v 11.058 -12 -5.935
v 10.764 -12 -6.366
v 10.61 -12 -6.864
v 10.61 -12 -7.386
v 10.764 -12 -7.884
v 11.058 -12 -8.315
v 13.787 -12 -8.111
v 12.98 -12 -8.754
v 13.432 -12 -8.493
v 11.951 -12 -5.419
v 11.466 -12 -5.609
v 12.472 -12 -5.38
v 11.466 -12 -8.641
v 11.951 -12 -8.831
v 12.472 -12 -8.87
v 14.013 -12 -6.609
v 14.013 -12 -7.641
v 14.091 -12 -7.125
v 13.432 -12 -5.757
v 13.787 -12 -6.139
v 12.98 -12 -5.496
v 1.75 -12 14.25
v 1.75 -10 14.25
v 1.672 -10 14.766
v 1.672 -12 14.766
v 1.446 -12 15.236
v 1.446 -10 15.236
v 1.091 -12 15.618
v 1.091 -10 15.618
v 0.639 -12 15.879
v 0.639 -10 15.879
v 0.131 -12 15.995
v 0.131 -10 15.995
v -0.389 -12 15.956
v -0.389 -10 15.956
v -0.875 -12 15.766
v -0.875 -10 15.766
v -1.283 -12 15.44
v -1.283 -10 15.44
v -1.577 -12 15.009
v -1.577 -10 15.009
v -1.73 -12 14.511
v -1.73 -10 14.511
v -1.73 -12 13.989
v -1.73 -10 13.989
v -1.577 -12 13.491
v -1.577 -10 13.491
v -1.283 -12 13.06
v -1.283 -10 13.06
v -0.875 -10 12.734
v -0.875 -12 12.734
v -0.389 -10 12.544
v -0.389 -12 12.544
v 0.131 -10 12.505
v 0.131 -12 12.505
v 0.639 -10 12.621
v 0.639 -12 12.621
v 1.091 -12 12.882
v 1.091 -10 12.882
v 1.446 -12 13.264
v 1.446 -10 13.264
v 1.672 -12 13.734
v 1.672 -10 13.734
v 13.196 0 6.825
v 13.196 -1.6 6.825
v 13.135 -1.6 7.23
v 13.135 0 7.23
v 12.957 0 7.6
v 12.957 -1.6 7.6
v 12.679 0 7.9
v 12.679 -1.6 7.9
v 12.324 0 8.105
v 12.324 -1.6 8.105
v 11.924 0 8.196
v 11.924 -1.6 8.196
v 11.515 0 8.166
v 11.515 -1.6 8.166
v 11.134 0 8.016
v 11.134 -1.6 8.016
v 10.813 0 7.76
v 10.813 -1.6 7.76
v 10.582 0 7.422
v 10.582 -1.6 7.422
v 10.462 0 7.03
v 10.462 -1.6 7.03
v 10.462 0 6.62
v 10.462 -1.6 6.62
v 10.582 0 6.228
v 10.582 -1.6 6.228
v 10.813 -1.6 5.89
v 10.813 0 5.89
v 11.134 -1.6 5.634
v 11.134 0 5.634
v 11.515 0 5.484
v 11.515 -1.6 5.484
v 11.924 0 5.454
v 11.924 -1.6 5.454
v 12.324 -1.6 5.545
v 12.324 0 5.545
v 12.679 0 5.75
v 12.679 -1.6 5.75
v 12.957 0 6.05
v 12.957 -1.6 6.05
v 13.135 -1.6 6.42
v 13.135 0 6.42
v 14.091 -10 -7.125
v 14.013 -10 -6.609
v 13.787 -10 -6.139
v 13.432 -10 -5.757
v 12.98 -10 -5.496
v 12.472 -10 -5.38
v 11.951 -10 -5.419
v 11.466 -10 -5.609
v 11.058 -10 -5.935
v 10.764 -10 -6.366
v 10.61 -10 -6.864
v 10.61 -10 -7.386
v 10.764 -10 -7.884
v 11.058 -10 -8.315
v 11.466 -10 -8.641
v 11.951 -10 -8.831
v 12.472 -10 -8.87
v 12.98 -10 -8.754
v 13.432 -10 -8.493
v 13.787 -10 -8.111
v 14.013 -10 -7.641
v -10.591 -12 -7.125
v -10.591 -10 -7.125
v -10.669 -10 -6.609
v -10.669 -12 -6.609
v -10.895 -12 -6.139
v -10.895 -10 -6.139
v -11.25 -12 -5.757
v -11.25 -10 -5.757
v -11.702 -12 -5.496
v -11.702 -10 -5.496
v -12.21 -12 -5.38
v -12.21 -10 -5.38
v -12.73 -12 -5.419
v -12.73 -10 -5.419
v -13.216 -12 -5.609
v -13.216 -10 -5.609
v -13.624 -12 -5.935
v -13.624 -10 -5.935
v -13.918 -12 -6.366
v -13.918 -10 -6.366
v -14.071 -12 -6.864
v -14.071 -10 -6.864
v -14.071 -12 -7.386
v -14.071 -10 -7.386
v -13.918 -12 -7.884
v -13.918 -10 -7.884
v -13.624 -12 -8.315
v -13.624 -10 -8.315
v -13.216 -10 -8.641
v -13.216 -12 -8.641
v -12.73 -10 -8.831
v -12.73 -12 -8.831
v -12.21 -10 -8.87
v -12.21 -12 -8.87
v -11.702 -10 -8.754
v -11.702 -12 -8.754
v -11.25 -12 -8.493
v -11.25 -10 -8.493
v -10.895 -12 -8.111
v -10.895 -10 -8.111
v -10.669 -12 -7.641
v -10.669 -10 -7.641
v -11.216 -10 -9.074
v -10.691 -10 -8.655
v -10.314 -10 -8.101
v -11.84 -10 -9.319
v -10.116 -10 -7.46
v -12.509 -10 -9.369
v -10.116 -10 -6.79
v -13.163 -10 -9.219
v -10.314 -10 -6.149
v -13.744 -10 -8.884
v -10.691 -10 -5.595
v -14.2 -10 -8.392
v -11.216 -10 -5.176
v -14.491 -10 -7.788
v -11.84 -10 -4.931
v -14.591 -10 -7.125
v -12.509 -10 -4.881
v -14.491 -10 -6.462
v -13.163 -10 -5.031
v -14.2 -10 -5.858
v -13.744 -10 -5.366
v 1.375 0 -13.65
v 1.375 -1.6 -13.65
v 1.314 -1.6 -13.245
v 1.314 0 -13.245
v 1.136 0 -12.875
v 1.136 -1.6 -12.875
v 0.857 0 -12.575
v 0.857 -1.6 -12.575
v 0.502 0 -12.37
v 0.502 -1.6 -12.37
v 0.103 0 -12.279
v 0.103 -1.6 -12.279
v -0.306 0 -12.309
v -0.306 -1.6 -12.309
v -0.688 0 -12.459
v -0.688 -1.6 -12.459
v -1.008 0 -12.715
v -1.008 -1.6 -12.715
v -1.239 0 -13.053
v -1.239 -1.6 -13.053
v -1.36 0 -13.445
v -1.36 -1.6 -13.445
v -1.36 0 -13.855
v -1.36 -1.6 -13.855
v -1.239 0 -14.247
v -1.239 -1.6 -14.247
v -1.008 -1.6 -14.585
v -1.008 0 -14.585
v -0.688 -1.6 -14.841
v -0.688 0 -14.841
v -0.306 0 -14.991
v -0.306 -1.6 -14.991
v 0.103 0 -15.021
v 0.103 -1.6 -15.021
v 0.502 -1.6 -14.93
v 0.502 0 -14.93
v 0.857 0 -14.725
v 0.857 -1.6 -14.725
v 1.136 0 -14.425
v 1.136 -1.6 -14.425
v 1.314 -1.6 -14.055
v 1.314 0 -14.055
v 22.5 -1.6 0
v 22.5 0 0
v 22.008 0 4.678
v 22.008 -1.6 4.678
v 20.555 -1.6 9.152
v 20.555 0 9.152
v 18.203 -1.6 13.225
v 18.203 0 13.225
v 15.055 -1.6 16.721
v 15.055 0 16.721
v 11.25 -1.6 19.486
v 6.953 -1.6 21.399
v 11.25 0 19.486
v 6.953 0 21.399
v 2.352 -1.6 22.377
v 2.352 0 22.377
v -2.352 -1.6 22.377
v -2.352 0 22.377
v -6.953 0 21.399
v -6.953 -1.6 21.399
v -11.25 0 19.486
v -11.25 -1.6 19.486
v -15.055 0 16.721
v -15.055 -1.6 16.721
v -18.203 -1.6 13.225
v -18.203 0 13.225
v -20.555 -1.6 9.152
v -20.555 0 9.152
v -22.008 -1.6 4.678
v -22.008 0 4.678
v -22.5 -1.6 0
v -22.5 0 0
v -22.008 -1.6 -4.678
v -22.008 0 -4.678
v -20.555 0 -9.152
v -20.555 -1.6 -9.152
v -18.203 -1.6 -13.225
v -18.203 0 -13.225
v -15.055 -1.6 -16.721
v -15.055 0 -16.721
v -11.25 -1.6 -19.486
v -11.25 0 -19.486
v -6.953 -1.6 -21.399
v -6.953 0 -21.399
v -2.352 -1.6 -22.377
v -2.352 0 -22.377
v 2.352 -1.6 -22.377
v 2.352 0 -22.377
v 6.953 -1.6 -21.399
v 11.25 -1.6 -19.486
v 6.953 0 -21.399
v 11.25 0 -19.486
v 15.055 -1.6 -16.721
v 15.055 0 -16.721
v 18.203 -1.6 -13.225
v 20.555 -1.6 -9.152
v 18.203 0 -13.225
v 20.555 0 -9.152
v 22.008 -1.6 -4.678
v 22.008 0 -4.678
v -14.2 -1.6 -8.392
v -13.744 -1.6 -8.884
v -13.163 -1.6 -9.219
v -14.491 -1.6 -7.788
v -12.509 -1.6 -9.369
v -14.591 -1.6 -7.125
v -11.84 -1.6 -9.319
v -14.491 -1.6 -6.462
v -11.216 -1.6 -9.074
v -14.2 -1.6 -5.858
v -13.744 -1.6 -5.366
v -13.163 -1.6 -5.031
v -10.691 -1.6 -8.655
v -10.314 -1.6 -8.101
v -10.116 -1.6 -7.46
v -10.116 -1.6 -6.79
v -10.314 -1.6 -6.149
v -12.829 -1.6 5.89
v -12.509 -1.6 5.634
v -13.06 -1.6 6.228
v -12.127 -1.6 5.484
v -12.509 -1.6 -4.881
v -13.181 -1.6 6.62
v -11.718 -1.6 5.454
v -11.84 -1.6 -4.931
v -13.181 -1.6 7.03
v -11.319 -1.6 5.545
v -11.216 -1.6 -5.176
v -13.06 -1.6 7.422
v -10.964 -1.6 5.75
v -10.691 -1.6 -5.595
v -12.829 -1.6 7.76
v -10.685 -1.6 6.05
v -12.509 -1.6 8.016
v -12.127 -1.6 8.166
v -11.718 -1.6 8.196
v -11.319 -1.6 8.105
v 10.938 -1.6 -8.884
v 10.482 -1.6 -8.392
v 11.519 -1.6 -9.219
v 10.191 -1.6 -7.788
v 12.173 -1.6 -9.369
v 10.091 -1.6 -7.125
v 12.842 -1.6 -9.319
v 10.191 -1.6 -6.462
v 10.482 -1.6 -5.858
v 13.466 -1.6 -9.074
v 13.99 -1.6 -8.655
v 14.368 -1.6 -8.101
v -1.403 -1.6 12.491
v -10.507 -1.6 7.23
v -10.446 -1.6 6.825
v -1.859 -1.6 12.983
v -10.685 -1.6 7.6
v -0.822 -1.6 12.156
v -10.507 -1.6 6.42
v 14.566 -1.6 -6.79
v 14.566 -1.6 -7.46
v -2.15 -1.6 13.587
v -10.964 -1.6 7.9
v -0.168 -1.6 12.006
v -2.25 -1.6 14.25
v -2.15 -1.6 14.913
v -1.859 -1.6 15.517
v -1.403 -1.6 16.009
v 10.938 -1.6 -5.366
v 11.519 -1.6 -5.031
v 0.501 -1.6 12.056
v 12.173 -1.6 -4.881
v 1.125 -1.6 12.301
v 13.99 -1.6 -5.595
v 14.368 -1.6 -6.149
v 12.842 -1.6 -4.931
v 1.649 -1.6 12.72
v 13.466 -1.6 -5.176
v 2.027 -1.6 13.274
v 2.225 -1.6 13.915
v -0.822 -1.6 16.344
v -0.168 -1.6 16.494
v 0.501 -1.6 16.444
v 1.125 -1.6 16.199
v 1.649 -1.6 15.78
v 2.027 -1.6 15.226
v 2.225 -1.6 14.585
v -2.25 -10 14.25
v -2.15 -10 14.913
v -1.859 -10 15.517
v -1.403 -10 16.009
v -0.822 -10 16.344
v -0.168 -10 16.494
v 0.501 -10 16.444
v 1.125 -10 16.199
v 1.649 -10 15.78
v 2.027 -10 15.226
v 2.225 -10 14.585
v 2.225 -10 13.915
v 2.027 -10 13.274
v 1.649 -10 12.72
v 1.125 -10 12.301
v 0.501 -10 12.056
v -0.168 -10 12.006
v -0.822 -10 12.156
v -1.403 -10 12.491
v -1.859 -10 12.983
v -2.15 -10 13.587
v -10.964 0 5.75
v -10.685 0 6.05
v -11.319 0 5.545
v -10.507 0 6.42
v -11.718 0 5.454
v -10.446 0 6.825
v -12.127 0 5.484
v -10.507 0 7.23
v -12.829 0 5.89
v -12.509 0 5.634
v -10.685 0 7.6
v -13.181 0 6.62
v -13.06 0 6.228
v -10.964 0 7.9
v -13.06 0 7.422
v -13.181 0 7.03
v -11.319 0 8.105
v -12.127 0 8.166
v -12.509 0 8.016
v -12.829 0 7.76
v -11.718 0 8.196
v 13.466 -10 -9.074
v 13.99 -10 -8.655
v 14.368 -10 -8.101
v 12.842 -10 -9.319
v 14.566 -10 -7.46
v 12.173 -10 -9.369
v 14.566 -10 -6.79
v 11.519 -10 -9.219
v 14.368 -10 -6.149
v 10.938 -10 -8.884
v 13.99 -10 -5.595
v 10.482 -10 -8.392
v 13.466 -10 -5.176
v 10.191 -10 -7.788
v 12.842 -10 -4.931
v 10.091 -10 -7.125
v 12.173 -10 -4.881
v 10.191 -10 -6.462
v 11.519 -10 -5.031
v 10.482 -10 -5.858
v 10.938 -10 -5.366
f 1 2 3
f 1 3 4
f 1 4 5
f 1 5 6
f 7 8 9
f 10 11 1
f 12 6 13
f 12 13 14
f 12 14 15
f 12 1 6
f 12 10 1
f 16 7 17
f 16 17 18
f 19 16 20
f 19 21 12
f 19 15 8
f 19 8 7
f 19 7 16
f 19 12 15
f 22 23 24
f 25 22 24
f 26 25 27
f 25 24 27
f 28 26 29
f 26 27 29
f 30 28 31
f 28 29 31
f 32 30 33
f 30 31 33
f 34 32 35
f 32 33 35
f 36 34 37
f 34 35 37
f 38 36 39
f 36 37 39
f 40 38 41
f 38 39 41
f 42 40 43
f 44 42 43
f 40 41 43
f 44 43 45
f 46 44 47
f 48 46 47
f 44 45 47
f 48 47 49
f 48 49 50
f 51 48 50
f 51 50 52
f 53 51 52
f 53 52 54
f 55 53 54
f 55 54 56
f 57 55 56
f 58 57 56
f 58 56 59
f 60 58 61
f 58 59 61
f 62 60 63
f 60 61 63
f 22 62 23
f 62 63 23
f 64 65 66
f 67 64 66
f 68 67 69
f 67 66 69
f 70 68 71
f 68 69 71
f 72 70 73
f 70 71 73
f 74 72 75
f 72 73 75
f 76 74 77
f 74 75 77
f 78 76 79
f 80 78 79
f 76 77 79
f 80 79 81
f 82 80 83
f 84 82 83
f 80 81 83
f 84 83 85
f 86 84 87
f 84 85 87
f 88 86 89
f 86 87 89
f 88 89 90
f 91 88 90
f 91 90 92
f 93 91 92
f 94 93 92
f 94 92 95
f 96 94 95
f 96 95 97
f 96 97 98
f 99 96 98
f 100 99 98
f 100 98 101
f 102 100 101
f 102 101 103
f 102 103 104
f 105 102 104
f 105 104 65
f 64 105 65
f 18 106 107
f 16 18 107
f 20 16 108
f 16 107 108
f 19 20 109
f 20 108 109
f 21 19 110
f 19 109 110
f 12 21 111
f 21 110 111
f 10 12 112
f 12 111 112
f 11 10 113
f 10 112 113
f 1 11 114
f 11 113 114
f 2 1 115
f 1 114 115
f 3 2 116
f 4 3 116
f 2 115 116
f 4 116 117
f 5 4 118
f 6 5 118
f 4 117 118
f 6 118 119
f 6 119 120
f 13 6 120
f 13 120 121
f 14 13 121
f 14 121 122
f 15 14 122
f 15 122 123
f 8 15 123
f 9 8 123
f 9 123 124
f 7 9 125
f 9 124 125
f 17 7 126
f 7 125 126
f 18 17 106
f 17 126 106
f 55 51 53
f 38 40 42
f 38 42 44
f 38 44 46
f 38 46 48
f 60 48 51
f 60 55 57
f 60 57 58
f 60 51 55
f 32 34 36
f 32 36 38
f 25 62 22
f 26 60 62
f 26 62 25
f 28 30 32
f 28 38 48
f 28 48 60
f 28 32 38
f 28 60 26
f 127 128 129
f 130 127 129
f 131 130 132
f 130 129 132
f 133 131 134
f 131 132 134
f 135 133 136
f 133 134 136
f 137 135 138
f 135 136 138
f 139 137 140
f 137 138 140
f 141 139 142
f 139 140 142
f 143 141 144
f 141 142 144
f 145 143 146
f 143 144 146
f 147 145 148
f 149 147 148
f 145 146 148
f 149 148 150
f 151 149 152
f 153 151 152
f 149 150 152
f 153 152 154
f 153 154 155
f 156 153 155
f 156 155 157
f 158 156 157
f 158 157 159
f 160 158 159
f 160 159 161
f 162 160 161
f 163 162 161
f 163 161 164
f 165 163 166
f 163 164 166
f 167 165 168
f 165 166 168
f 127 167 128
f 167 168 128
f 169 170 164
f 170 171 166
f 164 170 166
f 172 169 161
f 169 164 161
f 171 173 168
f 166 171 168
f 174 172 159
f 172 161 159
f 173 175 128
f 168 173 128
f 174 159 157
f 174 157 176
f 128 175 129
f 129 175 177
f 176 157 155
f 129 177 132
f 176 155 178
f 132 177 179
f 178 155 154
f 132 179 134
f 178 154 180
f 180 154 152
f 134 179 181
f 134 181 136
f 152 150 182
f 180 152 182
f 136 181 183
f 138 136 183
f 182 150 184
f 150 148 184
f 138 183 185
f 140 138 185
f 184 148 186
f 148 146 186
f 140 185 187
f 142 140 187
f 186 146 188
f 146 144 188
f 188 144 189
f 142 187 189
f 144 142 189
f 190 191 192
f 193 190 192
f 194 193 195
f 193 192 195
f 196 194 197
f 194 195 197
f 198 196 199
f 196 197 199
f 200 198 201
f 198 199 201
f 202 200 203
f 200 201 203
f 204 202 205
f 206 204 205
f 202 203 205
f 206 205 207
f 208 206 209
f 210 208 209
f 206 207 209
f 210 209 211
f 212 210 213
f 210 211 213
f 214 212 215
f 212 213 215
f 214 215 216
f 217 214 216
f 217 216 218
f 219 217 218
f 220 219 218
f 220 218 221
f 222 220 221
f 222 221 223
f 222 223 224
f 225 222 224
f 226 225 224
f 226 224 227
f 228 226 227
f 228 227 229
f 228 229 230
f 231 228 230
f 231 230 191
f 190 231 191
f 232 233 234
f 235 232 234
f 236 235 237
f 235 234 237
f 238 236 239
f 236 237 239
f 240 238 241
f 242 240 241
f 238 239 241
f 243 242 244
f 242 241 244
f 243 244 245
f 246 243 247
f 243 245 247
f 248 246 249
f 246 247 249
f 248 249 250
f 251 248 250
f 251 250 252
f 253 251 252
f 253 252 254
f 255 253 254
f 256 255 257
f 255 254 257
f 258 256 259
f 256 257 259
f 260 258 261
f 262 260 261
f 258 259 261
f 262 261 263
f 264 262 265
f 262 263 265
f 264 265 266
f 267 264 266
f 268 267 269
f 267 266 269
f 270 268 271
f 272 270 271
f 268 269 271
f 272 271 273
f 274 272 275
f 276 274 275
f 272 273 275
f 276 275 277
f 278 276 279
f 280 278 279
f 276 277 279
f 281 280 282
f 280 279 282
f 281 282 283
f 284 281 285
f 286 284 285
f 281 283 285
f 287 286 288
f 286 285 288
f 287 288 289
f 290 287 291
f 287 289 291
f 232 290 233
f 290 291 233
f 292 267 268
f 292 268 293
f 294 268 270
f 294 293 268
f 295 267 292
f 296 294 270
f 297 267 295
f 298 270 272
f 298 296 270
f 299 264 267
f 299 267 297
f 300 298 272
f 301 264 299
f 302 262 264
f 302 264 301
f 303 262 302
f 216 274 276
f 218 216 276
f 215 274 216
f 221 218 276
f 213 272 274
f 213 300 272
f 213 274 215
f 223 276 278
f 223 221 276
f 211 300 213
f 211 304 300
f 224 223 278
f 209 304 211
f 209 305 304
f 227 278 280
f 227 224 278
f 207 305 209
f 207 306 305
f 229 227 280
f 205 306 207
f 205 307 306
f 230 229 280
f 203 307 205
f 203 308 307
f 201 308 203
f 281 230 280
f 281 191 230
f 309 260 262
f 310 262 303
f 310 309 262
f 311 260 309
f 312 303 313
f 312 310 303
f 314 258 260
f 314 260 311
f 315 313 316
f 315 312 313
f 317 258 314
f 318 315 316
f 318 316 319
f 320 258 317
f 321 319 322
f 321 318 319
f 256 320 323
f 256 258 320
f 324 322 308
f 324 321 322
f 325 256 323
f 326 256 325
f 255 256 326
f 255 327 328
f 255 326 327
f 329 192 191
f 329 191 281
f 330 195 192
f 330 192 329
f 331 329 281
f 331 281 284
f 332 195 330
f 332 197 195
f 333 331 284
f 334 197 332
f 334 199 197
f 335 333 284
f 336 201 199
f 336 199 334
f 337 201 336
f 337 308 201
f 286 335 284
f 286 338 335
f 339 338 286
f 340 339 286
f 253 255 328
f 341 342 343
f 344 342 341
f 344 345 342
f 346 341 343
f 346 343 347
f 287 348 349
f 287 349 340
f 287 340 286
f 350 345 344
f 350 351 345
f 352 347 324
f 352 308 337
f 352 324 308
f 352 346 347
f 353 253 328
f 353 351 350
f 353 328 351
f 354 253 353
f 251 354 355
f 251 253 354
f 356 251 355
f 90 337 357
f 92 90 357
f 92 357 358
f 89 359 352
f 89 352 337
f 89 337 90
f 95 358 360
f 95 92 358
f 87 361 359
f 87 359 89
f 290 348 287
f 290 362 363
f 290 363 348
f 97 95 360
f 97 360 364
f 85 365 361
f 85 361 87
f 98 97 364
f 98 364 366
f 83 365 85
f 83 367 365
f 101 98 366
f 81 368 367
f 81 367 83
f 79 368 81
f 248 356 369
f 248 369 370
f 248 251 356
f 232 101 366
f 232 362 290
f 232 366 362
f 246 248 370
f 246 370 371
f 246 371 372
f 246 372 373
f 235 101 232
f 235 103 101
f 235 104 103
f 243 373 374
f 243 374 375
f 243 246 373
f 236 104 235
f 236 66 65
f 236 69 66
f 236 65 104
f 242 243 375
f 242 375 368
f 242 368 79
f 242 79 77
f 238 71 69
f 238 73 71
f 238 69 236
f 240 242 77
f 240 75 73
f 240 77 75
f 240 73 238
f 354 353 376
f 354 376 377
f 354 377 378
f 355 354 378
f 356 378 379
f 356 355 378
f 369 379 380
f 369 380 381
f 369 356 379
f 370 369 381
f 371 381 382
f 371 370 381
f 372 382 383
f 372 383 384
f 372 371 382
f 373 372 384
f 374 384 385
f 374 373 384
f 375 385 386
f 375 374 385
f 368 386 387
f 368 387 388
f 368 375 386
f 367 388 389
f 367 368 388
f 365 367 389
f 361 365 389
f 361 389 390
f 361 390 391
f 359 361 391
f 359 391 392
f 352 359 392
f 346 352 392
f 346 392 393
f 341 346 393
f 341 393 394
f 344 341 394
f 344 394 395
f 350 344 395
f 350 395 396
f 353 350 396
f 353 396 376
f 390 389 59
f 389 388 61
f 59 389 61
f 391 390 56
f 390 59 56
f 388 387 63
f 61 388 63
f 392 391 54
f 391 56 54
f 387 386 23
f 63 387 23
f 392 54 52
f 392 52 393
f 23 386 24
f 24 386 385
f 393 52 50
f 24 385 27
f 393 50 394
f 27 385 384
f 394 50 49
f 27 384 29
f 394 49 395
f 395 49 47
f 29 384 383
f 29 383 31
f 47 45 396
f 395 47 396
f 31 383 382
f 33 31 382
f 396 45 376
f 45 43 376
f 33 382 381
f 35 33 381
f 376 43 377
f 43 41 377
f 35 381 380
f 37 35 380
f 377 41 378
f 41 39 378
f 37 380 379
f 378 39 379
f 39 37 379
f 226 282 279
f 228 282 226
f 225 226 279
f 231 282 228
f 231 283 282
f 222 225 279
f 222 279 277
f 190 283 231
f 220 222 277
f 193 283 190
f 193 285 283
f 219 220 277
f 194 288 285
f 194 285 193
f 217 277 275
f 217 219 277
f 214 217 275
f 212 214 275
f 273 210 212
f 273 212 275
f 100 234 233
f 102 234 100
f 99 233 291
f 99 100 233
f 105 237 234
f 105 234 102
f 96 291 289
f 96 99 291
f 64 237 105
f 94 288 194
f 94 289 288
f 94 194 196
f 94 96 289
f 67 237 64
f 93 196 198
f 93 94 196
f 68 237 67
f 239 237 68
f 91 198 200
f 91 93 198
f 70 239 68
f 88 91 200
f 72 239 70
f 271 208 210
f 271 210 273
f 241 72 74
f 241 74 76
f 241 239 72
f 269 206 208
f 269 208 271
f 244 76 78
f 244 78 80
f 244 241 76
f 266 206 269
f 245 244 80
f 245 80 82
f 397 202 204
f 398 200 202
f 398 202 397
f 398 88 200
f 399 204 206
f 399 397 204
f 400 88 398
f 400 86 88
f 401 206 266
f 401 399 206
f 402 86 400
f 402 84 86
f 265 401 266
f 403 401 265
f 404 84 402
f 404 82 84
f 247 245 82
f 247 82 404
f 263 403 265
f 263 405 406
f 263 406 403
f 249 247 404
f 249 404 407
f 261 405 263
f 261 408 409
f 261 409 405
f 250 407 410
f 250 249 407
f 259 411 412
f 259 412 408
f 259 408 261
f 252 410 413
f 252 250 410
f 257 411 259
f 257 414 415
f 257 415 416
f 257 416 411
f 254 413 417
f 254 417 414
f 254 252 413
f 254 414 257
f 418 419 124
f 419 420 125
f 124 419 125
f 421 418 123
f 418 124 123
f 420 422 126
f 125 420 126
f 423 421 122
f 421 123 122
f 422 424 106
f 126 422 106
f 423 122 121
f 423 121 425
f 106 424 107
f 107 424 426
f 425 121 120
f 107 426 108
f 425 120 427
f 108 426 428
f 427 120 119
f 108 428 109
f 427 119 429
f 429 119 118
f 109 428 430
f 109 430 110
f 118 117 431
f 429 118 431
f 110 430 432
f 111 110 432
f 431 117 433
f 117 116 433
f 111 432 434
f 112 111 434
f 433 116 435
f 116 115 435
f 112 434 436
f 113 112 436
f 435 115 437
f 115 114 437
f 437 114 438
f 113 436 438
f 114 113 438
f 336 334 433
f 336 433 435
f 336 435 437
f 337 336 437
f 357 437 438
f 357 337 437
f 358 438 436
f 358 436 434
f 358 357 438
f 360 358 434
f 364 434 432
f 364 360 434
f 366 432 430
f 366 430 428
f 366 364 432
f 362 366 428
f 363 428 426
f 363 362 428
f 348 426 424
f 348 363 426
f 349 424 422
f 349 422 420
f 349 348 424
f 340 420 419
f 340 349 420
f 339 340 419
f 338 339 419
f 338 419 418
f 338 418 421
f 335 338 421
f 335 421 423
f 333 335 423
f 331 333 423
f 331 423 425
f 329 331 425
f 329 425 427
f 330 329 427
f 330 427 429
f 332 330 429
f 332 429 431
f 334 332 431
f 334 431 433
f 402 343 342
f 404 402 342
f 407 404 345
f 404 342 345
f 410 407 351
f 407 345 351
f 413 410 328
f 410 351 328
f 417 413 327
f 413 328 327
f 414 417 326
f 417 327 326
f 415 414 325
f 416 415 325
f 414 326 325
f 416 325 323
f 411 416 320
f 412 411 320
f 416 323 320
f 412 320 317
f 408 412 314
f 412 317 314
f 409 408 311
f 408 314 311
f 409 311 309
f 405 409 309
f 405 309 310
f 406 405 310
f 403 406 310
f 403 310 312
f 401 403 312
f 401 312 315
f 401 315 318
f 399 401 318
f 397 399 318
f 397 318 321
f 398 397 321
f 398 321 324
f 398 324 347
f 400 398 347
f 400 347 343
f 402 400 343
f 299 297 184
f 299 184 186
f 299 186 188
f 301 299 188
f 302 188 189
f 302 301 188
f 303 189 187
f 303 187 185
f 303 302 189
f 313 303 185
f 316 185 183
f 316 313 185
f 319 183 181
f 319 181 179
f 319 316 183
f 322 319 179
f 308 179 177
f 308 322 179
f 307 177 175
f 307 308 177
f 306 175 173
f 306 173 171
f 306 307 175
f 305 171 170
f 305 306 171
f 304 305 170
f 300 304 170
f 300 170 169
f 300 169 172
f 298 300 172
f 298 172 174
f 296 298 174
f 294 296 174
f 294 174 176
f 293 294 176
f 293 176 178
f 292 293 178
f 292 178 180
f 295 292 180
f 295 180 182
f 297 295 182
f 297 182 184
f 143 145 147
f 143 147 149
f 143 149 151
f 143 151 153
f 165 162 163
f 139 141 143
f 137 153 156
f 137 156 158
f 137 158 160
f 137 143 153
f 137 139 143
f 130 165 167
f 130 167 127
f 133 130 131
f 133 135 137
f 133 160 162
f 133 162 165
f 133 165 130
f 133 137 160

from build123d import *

# Parameters (mm, degrees)
F0_R     = 22.5
F1_DEPTH = 1.6
F4_D     = 2.75
F2_R     = 2.25
F5_DEPTH = 10
F6_R     = 1.75
F7_R     = 1.75
F8_R     = 1.75
F9_DEPTH = 2


with BuildPart() as f1:
    # F0 (on Front) → F1 (new body)
    with BuildSketch(Plane.XZ):
        Circle(F0_R)
    extrude(amount=F1_DEPTH)

    # F4 (through all)
    with Locations(Plane(origin=(0, 0, 0), x_dir=(-1, 0, 0), z_dir=(0, 1, 0))):
        with Locations((11.821247, 6.825), (0, -13.65), (-11.821247, 6.825)):
            Hole(F4_D / 2)

    # F2 (on face) → F5 (join)
    with BuildSketch(Plane(origin=(0, 0, 0), x_dir=(-1, 0, 0), z_dir=(0, 1, 0))):
        with Locations((0, 14.25)):
            Circle(F2_R)
        with Locations((-12.340862, -7.125)):
            Circle(F2_R)
        with Locations((12.340862, -7.125)):
            Circle(F2_R)
    extrude(amount=-F5_DEPTH)

    # F6 (on face) + F7 (on face) + F8 (on face) → F9 (join)
    with BuildSketch(Plane.XZ.offset(10)):
        with Locations((0, 14.25)):
            Circle(F6_R)
    with BuildSketch(Plane.XZ.offset(10)):
        with Locations((-12.340862, -7.125)):
            Circle(F7_R)
    with BuildSketch(Plane.XZ.offset(10)):
        with Locations((12.340862, -7.125)):
            Circle(F8_R)
    extrude(amount=F9_DEPTH)


solid = f1.part
